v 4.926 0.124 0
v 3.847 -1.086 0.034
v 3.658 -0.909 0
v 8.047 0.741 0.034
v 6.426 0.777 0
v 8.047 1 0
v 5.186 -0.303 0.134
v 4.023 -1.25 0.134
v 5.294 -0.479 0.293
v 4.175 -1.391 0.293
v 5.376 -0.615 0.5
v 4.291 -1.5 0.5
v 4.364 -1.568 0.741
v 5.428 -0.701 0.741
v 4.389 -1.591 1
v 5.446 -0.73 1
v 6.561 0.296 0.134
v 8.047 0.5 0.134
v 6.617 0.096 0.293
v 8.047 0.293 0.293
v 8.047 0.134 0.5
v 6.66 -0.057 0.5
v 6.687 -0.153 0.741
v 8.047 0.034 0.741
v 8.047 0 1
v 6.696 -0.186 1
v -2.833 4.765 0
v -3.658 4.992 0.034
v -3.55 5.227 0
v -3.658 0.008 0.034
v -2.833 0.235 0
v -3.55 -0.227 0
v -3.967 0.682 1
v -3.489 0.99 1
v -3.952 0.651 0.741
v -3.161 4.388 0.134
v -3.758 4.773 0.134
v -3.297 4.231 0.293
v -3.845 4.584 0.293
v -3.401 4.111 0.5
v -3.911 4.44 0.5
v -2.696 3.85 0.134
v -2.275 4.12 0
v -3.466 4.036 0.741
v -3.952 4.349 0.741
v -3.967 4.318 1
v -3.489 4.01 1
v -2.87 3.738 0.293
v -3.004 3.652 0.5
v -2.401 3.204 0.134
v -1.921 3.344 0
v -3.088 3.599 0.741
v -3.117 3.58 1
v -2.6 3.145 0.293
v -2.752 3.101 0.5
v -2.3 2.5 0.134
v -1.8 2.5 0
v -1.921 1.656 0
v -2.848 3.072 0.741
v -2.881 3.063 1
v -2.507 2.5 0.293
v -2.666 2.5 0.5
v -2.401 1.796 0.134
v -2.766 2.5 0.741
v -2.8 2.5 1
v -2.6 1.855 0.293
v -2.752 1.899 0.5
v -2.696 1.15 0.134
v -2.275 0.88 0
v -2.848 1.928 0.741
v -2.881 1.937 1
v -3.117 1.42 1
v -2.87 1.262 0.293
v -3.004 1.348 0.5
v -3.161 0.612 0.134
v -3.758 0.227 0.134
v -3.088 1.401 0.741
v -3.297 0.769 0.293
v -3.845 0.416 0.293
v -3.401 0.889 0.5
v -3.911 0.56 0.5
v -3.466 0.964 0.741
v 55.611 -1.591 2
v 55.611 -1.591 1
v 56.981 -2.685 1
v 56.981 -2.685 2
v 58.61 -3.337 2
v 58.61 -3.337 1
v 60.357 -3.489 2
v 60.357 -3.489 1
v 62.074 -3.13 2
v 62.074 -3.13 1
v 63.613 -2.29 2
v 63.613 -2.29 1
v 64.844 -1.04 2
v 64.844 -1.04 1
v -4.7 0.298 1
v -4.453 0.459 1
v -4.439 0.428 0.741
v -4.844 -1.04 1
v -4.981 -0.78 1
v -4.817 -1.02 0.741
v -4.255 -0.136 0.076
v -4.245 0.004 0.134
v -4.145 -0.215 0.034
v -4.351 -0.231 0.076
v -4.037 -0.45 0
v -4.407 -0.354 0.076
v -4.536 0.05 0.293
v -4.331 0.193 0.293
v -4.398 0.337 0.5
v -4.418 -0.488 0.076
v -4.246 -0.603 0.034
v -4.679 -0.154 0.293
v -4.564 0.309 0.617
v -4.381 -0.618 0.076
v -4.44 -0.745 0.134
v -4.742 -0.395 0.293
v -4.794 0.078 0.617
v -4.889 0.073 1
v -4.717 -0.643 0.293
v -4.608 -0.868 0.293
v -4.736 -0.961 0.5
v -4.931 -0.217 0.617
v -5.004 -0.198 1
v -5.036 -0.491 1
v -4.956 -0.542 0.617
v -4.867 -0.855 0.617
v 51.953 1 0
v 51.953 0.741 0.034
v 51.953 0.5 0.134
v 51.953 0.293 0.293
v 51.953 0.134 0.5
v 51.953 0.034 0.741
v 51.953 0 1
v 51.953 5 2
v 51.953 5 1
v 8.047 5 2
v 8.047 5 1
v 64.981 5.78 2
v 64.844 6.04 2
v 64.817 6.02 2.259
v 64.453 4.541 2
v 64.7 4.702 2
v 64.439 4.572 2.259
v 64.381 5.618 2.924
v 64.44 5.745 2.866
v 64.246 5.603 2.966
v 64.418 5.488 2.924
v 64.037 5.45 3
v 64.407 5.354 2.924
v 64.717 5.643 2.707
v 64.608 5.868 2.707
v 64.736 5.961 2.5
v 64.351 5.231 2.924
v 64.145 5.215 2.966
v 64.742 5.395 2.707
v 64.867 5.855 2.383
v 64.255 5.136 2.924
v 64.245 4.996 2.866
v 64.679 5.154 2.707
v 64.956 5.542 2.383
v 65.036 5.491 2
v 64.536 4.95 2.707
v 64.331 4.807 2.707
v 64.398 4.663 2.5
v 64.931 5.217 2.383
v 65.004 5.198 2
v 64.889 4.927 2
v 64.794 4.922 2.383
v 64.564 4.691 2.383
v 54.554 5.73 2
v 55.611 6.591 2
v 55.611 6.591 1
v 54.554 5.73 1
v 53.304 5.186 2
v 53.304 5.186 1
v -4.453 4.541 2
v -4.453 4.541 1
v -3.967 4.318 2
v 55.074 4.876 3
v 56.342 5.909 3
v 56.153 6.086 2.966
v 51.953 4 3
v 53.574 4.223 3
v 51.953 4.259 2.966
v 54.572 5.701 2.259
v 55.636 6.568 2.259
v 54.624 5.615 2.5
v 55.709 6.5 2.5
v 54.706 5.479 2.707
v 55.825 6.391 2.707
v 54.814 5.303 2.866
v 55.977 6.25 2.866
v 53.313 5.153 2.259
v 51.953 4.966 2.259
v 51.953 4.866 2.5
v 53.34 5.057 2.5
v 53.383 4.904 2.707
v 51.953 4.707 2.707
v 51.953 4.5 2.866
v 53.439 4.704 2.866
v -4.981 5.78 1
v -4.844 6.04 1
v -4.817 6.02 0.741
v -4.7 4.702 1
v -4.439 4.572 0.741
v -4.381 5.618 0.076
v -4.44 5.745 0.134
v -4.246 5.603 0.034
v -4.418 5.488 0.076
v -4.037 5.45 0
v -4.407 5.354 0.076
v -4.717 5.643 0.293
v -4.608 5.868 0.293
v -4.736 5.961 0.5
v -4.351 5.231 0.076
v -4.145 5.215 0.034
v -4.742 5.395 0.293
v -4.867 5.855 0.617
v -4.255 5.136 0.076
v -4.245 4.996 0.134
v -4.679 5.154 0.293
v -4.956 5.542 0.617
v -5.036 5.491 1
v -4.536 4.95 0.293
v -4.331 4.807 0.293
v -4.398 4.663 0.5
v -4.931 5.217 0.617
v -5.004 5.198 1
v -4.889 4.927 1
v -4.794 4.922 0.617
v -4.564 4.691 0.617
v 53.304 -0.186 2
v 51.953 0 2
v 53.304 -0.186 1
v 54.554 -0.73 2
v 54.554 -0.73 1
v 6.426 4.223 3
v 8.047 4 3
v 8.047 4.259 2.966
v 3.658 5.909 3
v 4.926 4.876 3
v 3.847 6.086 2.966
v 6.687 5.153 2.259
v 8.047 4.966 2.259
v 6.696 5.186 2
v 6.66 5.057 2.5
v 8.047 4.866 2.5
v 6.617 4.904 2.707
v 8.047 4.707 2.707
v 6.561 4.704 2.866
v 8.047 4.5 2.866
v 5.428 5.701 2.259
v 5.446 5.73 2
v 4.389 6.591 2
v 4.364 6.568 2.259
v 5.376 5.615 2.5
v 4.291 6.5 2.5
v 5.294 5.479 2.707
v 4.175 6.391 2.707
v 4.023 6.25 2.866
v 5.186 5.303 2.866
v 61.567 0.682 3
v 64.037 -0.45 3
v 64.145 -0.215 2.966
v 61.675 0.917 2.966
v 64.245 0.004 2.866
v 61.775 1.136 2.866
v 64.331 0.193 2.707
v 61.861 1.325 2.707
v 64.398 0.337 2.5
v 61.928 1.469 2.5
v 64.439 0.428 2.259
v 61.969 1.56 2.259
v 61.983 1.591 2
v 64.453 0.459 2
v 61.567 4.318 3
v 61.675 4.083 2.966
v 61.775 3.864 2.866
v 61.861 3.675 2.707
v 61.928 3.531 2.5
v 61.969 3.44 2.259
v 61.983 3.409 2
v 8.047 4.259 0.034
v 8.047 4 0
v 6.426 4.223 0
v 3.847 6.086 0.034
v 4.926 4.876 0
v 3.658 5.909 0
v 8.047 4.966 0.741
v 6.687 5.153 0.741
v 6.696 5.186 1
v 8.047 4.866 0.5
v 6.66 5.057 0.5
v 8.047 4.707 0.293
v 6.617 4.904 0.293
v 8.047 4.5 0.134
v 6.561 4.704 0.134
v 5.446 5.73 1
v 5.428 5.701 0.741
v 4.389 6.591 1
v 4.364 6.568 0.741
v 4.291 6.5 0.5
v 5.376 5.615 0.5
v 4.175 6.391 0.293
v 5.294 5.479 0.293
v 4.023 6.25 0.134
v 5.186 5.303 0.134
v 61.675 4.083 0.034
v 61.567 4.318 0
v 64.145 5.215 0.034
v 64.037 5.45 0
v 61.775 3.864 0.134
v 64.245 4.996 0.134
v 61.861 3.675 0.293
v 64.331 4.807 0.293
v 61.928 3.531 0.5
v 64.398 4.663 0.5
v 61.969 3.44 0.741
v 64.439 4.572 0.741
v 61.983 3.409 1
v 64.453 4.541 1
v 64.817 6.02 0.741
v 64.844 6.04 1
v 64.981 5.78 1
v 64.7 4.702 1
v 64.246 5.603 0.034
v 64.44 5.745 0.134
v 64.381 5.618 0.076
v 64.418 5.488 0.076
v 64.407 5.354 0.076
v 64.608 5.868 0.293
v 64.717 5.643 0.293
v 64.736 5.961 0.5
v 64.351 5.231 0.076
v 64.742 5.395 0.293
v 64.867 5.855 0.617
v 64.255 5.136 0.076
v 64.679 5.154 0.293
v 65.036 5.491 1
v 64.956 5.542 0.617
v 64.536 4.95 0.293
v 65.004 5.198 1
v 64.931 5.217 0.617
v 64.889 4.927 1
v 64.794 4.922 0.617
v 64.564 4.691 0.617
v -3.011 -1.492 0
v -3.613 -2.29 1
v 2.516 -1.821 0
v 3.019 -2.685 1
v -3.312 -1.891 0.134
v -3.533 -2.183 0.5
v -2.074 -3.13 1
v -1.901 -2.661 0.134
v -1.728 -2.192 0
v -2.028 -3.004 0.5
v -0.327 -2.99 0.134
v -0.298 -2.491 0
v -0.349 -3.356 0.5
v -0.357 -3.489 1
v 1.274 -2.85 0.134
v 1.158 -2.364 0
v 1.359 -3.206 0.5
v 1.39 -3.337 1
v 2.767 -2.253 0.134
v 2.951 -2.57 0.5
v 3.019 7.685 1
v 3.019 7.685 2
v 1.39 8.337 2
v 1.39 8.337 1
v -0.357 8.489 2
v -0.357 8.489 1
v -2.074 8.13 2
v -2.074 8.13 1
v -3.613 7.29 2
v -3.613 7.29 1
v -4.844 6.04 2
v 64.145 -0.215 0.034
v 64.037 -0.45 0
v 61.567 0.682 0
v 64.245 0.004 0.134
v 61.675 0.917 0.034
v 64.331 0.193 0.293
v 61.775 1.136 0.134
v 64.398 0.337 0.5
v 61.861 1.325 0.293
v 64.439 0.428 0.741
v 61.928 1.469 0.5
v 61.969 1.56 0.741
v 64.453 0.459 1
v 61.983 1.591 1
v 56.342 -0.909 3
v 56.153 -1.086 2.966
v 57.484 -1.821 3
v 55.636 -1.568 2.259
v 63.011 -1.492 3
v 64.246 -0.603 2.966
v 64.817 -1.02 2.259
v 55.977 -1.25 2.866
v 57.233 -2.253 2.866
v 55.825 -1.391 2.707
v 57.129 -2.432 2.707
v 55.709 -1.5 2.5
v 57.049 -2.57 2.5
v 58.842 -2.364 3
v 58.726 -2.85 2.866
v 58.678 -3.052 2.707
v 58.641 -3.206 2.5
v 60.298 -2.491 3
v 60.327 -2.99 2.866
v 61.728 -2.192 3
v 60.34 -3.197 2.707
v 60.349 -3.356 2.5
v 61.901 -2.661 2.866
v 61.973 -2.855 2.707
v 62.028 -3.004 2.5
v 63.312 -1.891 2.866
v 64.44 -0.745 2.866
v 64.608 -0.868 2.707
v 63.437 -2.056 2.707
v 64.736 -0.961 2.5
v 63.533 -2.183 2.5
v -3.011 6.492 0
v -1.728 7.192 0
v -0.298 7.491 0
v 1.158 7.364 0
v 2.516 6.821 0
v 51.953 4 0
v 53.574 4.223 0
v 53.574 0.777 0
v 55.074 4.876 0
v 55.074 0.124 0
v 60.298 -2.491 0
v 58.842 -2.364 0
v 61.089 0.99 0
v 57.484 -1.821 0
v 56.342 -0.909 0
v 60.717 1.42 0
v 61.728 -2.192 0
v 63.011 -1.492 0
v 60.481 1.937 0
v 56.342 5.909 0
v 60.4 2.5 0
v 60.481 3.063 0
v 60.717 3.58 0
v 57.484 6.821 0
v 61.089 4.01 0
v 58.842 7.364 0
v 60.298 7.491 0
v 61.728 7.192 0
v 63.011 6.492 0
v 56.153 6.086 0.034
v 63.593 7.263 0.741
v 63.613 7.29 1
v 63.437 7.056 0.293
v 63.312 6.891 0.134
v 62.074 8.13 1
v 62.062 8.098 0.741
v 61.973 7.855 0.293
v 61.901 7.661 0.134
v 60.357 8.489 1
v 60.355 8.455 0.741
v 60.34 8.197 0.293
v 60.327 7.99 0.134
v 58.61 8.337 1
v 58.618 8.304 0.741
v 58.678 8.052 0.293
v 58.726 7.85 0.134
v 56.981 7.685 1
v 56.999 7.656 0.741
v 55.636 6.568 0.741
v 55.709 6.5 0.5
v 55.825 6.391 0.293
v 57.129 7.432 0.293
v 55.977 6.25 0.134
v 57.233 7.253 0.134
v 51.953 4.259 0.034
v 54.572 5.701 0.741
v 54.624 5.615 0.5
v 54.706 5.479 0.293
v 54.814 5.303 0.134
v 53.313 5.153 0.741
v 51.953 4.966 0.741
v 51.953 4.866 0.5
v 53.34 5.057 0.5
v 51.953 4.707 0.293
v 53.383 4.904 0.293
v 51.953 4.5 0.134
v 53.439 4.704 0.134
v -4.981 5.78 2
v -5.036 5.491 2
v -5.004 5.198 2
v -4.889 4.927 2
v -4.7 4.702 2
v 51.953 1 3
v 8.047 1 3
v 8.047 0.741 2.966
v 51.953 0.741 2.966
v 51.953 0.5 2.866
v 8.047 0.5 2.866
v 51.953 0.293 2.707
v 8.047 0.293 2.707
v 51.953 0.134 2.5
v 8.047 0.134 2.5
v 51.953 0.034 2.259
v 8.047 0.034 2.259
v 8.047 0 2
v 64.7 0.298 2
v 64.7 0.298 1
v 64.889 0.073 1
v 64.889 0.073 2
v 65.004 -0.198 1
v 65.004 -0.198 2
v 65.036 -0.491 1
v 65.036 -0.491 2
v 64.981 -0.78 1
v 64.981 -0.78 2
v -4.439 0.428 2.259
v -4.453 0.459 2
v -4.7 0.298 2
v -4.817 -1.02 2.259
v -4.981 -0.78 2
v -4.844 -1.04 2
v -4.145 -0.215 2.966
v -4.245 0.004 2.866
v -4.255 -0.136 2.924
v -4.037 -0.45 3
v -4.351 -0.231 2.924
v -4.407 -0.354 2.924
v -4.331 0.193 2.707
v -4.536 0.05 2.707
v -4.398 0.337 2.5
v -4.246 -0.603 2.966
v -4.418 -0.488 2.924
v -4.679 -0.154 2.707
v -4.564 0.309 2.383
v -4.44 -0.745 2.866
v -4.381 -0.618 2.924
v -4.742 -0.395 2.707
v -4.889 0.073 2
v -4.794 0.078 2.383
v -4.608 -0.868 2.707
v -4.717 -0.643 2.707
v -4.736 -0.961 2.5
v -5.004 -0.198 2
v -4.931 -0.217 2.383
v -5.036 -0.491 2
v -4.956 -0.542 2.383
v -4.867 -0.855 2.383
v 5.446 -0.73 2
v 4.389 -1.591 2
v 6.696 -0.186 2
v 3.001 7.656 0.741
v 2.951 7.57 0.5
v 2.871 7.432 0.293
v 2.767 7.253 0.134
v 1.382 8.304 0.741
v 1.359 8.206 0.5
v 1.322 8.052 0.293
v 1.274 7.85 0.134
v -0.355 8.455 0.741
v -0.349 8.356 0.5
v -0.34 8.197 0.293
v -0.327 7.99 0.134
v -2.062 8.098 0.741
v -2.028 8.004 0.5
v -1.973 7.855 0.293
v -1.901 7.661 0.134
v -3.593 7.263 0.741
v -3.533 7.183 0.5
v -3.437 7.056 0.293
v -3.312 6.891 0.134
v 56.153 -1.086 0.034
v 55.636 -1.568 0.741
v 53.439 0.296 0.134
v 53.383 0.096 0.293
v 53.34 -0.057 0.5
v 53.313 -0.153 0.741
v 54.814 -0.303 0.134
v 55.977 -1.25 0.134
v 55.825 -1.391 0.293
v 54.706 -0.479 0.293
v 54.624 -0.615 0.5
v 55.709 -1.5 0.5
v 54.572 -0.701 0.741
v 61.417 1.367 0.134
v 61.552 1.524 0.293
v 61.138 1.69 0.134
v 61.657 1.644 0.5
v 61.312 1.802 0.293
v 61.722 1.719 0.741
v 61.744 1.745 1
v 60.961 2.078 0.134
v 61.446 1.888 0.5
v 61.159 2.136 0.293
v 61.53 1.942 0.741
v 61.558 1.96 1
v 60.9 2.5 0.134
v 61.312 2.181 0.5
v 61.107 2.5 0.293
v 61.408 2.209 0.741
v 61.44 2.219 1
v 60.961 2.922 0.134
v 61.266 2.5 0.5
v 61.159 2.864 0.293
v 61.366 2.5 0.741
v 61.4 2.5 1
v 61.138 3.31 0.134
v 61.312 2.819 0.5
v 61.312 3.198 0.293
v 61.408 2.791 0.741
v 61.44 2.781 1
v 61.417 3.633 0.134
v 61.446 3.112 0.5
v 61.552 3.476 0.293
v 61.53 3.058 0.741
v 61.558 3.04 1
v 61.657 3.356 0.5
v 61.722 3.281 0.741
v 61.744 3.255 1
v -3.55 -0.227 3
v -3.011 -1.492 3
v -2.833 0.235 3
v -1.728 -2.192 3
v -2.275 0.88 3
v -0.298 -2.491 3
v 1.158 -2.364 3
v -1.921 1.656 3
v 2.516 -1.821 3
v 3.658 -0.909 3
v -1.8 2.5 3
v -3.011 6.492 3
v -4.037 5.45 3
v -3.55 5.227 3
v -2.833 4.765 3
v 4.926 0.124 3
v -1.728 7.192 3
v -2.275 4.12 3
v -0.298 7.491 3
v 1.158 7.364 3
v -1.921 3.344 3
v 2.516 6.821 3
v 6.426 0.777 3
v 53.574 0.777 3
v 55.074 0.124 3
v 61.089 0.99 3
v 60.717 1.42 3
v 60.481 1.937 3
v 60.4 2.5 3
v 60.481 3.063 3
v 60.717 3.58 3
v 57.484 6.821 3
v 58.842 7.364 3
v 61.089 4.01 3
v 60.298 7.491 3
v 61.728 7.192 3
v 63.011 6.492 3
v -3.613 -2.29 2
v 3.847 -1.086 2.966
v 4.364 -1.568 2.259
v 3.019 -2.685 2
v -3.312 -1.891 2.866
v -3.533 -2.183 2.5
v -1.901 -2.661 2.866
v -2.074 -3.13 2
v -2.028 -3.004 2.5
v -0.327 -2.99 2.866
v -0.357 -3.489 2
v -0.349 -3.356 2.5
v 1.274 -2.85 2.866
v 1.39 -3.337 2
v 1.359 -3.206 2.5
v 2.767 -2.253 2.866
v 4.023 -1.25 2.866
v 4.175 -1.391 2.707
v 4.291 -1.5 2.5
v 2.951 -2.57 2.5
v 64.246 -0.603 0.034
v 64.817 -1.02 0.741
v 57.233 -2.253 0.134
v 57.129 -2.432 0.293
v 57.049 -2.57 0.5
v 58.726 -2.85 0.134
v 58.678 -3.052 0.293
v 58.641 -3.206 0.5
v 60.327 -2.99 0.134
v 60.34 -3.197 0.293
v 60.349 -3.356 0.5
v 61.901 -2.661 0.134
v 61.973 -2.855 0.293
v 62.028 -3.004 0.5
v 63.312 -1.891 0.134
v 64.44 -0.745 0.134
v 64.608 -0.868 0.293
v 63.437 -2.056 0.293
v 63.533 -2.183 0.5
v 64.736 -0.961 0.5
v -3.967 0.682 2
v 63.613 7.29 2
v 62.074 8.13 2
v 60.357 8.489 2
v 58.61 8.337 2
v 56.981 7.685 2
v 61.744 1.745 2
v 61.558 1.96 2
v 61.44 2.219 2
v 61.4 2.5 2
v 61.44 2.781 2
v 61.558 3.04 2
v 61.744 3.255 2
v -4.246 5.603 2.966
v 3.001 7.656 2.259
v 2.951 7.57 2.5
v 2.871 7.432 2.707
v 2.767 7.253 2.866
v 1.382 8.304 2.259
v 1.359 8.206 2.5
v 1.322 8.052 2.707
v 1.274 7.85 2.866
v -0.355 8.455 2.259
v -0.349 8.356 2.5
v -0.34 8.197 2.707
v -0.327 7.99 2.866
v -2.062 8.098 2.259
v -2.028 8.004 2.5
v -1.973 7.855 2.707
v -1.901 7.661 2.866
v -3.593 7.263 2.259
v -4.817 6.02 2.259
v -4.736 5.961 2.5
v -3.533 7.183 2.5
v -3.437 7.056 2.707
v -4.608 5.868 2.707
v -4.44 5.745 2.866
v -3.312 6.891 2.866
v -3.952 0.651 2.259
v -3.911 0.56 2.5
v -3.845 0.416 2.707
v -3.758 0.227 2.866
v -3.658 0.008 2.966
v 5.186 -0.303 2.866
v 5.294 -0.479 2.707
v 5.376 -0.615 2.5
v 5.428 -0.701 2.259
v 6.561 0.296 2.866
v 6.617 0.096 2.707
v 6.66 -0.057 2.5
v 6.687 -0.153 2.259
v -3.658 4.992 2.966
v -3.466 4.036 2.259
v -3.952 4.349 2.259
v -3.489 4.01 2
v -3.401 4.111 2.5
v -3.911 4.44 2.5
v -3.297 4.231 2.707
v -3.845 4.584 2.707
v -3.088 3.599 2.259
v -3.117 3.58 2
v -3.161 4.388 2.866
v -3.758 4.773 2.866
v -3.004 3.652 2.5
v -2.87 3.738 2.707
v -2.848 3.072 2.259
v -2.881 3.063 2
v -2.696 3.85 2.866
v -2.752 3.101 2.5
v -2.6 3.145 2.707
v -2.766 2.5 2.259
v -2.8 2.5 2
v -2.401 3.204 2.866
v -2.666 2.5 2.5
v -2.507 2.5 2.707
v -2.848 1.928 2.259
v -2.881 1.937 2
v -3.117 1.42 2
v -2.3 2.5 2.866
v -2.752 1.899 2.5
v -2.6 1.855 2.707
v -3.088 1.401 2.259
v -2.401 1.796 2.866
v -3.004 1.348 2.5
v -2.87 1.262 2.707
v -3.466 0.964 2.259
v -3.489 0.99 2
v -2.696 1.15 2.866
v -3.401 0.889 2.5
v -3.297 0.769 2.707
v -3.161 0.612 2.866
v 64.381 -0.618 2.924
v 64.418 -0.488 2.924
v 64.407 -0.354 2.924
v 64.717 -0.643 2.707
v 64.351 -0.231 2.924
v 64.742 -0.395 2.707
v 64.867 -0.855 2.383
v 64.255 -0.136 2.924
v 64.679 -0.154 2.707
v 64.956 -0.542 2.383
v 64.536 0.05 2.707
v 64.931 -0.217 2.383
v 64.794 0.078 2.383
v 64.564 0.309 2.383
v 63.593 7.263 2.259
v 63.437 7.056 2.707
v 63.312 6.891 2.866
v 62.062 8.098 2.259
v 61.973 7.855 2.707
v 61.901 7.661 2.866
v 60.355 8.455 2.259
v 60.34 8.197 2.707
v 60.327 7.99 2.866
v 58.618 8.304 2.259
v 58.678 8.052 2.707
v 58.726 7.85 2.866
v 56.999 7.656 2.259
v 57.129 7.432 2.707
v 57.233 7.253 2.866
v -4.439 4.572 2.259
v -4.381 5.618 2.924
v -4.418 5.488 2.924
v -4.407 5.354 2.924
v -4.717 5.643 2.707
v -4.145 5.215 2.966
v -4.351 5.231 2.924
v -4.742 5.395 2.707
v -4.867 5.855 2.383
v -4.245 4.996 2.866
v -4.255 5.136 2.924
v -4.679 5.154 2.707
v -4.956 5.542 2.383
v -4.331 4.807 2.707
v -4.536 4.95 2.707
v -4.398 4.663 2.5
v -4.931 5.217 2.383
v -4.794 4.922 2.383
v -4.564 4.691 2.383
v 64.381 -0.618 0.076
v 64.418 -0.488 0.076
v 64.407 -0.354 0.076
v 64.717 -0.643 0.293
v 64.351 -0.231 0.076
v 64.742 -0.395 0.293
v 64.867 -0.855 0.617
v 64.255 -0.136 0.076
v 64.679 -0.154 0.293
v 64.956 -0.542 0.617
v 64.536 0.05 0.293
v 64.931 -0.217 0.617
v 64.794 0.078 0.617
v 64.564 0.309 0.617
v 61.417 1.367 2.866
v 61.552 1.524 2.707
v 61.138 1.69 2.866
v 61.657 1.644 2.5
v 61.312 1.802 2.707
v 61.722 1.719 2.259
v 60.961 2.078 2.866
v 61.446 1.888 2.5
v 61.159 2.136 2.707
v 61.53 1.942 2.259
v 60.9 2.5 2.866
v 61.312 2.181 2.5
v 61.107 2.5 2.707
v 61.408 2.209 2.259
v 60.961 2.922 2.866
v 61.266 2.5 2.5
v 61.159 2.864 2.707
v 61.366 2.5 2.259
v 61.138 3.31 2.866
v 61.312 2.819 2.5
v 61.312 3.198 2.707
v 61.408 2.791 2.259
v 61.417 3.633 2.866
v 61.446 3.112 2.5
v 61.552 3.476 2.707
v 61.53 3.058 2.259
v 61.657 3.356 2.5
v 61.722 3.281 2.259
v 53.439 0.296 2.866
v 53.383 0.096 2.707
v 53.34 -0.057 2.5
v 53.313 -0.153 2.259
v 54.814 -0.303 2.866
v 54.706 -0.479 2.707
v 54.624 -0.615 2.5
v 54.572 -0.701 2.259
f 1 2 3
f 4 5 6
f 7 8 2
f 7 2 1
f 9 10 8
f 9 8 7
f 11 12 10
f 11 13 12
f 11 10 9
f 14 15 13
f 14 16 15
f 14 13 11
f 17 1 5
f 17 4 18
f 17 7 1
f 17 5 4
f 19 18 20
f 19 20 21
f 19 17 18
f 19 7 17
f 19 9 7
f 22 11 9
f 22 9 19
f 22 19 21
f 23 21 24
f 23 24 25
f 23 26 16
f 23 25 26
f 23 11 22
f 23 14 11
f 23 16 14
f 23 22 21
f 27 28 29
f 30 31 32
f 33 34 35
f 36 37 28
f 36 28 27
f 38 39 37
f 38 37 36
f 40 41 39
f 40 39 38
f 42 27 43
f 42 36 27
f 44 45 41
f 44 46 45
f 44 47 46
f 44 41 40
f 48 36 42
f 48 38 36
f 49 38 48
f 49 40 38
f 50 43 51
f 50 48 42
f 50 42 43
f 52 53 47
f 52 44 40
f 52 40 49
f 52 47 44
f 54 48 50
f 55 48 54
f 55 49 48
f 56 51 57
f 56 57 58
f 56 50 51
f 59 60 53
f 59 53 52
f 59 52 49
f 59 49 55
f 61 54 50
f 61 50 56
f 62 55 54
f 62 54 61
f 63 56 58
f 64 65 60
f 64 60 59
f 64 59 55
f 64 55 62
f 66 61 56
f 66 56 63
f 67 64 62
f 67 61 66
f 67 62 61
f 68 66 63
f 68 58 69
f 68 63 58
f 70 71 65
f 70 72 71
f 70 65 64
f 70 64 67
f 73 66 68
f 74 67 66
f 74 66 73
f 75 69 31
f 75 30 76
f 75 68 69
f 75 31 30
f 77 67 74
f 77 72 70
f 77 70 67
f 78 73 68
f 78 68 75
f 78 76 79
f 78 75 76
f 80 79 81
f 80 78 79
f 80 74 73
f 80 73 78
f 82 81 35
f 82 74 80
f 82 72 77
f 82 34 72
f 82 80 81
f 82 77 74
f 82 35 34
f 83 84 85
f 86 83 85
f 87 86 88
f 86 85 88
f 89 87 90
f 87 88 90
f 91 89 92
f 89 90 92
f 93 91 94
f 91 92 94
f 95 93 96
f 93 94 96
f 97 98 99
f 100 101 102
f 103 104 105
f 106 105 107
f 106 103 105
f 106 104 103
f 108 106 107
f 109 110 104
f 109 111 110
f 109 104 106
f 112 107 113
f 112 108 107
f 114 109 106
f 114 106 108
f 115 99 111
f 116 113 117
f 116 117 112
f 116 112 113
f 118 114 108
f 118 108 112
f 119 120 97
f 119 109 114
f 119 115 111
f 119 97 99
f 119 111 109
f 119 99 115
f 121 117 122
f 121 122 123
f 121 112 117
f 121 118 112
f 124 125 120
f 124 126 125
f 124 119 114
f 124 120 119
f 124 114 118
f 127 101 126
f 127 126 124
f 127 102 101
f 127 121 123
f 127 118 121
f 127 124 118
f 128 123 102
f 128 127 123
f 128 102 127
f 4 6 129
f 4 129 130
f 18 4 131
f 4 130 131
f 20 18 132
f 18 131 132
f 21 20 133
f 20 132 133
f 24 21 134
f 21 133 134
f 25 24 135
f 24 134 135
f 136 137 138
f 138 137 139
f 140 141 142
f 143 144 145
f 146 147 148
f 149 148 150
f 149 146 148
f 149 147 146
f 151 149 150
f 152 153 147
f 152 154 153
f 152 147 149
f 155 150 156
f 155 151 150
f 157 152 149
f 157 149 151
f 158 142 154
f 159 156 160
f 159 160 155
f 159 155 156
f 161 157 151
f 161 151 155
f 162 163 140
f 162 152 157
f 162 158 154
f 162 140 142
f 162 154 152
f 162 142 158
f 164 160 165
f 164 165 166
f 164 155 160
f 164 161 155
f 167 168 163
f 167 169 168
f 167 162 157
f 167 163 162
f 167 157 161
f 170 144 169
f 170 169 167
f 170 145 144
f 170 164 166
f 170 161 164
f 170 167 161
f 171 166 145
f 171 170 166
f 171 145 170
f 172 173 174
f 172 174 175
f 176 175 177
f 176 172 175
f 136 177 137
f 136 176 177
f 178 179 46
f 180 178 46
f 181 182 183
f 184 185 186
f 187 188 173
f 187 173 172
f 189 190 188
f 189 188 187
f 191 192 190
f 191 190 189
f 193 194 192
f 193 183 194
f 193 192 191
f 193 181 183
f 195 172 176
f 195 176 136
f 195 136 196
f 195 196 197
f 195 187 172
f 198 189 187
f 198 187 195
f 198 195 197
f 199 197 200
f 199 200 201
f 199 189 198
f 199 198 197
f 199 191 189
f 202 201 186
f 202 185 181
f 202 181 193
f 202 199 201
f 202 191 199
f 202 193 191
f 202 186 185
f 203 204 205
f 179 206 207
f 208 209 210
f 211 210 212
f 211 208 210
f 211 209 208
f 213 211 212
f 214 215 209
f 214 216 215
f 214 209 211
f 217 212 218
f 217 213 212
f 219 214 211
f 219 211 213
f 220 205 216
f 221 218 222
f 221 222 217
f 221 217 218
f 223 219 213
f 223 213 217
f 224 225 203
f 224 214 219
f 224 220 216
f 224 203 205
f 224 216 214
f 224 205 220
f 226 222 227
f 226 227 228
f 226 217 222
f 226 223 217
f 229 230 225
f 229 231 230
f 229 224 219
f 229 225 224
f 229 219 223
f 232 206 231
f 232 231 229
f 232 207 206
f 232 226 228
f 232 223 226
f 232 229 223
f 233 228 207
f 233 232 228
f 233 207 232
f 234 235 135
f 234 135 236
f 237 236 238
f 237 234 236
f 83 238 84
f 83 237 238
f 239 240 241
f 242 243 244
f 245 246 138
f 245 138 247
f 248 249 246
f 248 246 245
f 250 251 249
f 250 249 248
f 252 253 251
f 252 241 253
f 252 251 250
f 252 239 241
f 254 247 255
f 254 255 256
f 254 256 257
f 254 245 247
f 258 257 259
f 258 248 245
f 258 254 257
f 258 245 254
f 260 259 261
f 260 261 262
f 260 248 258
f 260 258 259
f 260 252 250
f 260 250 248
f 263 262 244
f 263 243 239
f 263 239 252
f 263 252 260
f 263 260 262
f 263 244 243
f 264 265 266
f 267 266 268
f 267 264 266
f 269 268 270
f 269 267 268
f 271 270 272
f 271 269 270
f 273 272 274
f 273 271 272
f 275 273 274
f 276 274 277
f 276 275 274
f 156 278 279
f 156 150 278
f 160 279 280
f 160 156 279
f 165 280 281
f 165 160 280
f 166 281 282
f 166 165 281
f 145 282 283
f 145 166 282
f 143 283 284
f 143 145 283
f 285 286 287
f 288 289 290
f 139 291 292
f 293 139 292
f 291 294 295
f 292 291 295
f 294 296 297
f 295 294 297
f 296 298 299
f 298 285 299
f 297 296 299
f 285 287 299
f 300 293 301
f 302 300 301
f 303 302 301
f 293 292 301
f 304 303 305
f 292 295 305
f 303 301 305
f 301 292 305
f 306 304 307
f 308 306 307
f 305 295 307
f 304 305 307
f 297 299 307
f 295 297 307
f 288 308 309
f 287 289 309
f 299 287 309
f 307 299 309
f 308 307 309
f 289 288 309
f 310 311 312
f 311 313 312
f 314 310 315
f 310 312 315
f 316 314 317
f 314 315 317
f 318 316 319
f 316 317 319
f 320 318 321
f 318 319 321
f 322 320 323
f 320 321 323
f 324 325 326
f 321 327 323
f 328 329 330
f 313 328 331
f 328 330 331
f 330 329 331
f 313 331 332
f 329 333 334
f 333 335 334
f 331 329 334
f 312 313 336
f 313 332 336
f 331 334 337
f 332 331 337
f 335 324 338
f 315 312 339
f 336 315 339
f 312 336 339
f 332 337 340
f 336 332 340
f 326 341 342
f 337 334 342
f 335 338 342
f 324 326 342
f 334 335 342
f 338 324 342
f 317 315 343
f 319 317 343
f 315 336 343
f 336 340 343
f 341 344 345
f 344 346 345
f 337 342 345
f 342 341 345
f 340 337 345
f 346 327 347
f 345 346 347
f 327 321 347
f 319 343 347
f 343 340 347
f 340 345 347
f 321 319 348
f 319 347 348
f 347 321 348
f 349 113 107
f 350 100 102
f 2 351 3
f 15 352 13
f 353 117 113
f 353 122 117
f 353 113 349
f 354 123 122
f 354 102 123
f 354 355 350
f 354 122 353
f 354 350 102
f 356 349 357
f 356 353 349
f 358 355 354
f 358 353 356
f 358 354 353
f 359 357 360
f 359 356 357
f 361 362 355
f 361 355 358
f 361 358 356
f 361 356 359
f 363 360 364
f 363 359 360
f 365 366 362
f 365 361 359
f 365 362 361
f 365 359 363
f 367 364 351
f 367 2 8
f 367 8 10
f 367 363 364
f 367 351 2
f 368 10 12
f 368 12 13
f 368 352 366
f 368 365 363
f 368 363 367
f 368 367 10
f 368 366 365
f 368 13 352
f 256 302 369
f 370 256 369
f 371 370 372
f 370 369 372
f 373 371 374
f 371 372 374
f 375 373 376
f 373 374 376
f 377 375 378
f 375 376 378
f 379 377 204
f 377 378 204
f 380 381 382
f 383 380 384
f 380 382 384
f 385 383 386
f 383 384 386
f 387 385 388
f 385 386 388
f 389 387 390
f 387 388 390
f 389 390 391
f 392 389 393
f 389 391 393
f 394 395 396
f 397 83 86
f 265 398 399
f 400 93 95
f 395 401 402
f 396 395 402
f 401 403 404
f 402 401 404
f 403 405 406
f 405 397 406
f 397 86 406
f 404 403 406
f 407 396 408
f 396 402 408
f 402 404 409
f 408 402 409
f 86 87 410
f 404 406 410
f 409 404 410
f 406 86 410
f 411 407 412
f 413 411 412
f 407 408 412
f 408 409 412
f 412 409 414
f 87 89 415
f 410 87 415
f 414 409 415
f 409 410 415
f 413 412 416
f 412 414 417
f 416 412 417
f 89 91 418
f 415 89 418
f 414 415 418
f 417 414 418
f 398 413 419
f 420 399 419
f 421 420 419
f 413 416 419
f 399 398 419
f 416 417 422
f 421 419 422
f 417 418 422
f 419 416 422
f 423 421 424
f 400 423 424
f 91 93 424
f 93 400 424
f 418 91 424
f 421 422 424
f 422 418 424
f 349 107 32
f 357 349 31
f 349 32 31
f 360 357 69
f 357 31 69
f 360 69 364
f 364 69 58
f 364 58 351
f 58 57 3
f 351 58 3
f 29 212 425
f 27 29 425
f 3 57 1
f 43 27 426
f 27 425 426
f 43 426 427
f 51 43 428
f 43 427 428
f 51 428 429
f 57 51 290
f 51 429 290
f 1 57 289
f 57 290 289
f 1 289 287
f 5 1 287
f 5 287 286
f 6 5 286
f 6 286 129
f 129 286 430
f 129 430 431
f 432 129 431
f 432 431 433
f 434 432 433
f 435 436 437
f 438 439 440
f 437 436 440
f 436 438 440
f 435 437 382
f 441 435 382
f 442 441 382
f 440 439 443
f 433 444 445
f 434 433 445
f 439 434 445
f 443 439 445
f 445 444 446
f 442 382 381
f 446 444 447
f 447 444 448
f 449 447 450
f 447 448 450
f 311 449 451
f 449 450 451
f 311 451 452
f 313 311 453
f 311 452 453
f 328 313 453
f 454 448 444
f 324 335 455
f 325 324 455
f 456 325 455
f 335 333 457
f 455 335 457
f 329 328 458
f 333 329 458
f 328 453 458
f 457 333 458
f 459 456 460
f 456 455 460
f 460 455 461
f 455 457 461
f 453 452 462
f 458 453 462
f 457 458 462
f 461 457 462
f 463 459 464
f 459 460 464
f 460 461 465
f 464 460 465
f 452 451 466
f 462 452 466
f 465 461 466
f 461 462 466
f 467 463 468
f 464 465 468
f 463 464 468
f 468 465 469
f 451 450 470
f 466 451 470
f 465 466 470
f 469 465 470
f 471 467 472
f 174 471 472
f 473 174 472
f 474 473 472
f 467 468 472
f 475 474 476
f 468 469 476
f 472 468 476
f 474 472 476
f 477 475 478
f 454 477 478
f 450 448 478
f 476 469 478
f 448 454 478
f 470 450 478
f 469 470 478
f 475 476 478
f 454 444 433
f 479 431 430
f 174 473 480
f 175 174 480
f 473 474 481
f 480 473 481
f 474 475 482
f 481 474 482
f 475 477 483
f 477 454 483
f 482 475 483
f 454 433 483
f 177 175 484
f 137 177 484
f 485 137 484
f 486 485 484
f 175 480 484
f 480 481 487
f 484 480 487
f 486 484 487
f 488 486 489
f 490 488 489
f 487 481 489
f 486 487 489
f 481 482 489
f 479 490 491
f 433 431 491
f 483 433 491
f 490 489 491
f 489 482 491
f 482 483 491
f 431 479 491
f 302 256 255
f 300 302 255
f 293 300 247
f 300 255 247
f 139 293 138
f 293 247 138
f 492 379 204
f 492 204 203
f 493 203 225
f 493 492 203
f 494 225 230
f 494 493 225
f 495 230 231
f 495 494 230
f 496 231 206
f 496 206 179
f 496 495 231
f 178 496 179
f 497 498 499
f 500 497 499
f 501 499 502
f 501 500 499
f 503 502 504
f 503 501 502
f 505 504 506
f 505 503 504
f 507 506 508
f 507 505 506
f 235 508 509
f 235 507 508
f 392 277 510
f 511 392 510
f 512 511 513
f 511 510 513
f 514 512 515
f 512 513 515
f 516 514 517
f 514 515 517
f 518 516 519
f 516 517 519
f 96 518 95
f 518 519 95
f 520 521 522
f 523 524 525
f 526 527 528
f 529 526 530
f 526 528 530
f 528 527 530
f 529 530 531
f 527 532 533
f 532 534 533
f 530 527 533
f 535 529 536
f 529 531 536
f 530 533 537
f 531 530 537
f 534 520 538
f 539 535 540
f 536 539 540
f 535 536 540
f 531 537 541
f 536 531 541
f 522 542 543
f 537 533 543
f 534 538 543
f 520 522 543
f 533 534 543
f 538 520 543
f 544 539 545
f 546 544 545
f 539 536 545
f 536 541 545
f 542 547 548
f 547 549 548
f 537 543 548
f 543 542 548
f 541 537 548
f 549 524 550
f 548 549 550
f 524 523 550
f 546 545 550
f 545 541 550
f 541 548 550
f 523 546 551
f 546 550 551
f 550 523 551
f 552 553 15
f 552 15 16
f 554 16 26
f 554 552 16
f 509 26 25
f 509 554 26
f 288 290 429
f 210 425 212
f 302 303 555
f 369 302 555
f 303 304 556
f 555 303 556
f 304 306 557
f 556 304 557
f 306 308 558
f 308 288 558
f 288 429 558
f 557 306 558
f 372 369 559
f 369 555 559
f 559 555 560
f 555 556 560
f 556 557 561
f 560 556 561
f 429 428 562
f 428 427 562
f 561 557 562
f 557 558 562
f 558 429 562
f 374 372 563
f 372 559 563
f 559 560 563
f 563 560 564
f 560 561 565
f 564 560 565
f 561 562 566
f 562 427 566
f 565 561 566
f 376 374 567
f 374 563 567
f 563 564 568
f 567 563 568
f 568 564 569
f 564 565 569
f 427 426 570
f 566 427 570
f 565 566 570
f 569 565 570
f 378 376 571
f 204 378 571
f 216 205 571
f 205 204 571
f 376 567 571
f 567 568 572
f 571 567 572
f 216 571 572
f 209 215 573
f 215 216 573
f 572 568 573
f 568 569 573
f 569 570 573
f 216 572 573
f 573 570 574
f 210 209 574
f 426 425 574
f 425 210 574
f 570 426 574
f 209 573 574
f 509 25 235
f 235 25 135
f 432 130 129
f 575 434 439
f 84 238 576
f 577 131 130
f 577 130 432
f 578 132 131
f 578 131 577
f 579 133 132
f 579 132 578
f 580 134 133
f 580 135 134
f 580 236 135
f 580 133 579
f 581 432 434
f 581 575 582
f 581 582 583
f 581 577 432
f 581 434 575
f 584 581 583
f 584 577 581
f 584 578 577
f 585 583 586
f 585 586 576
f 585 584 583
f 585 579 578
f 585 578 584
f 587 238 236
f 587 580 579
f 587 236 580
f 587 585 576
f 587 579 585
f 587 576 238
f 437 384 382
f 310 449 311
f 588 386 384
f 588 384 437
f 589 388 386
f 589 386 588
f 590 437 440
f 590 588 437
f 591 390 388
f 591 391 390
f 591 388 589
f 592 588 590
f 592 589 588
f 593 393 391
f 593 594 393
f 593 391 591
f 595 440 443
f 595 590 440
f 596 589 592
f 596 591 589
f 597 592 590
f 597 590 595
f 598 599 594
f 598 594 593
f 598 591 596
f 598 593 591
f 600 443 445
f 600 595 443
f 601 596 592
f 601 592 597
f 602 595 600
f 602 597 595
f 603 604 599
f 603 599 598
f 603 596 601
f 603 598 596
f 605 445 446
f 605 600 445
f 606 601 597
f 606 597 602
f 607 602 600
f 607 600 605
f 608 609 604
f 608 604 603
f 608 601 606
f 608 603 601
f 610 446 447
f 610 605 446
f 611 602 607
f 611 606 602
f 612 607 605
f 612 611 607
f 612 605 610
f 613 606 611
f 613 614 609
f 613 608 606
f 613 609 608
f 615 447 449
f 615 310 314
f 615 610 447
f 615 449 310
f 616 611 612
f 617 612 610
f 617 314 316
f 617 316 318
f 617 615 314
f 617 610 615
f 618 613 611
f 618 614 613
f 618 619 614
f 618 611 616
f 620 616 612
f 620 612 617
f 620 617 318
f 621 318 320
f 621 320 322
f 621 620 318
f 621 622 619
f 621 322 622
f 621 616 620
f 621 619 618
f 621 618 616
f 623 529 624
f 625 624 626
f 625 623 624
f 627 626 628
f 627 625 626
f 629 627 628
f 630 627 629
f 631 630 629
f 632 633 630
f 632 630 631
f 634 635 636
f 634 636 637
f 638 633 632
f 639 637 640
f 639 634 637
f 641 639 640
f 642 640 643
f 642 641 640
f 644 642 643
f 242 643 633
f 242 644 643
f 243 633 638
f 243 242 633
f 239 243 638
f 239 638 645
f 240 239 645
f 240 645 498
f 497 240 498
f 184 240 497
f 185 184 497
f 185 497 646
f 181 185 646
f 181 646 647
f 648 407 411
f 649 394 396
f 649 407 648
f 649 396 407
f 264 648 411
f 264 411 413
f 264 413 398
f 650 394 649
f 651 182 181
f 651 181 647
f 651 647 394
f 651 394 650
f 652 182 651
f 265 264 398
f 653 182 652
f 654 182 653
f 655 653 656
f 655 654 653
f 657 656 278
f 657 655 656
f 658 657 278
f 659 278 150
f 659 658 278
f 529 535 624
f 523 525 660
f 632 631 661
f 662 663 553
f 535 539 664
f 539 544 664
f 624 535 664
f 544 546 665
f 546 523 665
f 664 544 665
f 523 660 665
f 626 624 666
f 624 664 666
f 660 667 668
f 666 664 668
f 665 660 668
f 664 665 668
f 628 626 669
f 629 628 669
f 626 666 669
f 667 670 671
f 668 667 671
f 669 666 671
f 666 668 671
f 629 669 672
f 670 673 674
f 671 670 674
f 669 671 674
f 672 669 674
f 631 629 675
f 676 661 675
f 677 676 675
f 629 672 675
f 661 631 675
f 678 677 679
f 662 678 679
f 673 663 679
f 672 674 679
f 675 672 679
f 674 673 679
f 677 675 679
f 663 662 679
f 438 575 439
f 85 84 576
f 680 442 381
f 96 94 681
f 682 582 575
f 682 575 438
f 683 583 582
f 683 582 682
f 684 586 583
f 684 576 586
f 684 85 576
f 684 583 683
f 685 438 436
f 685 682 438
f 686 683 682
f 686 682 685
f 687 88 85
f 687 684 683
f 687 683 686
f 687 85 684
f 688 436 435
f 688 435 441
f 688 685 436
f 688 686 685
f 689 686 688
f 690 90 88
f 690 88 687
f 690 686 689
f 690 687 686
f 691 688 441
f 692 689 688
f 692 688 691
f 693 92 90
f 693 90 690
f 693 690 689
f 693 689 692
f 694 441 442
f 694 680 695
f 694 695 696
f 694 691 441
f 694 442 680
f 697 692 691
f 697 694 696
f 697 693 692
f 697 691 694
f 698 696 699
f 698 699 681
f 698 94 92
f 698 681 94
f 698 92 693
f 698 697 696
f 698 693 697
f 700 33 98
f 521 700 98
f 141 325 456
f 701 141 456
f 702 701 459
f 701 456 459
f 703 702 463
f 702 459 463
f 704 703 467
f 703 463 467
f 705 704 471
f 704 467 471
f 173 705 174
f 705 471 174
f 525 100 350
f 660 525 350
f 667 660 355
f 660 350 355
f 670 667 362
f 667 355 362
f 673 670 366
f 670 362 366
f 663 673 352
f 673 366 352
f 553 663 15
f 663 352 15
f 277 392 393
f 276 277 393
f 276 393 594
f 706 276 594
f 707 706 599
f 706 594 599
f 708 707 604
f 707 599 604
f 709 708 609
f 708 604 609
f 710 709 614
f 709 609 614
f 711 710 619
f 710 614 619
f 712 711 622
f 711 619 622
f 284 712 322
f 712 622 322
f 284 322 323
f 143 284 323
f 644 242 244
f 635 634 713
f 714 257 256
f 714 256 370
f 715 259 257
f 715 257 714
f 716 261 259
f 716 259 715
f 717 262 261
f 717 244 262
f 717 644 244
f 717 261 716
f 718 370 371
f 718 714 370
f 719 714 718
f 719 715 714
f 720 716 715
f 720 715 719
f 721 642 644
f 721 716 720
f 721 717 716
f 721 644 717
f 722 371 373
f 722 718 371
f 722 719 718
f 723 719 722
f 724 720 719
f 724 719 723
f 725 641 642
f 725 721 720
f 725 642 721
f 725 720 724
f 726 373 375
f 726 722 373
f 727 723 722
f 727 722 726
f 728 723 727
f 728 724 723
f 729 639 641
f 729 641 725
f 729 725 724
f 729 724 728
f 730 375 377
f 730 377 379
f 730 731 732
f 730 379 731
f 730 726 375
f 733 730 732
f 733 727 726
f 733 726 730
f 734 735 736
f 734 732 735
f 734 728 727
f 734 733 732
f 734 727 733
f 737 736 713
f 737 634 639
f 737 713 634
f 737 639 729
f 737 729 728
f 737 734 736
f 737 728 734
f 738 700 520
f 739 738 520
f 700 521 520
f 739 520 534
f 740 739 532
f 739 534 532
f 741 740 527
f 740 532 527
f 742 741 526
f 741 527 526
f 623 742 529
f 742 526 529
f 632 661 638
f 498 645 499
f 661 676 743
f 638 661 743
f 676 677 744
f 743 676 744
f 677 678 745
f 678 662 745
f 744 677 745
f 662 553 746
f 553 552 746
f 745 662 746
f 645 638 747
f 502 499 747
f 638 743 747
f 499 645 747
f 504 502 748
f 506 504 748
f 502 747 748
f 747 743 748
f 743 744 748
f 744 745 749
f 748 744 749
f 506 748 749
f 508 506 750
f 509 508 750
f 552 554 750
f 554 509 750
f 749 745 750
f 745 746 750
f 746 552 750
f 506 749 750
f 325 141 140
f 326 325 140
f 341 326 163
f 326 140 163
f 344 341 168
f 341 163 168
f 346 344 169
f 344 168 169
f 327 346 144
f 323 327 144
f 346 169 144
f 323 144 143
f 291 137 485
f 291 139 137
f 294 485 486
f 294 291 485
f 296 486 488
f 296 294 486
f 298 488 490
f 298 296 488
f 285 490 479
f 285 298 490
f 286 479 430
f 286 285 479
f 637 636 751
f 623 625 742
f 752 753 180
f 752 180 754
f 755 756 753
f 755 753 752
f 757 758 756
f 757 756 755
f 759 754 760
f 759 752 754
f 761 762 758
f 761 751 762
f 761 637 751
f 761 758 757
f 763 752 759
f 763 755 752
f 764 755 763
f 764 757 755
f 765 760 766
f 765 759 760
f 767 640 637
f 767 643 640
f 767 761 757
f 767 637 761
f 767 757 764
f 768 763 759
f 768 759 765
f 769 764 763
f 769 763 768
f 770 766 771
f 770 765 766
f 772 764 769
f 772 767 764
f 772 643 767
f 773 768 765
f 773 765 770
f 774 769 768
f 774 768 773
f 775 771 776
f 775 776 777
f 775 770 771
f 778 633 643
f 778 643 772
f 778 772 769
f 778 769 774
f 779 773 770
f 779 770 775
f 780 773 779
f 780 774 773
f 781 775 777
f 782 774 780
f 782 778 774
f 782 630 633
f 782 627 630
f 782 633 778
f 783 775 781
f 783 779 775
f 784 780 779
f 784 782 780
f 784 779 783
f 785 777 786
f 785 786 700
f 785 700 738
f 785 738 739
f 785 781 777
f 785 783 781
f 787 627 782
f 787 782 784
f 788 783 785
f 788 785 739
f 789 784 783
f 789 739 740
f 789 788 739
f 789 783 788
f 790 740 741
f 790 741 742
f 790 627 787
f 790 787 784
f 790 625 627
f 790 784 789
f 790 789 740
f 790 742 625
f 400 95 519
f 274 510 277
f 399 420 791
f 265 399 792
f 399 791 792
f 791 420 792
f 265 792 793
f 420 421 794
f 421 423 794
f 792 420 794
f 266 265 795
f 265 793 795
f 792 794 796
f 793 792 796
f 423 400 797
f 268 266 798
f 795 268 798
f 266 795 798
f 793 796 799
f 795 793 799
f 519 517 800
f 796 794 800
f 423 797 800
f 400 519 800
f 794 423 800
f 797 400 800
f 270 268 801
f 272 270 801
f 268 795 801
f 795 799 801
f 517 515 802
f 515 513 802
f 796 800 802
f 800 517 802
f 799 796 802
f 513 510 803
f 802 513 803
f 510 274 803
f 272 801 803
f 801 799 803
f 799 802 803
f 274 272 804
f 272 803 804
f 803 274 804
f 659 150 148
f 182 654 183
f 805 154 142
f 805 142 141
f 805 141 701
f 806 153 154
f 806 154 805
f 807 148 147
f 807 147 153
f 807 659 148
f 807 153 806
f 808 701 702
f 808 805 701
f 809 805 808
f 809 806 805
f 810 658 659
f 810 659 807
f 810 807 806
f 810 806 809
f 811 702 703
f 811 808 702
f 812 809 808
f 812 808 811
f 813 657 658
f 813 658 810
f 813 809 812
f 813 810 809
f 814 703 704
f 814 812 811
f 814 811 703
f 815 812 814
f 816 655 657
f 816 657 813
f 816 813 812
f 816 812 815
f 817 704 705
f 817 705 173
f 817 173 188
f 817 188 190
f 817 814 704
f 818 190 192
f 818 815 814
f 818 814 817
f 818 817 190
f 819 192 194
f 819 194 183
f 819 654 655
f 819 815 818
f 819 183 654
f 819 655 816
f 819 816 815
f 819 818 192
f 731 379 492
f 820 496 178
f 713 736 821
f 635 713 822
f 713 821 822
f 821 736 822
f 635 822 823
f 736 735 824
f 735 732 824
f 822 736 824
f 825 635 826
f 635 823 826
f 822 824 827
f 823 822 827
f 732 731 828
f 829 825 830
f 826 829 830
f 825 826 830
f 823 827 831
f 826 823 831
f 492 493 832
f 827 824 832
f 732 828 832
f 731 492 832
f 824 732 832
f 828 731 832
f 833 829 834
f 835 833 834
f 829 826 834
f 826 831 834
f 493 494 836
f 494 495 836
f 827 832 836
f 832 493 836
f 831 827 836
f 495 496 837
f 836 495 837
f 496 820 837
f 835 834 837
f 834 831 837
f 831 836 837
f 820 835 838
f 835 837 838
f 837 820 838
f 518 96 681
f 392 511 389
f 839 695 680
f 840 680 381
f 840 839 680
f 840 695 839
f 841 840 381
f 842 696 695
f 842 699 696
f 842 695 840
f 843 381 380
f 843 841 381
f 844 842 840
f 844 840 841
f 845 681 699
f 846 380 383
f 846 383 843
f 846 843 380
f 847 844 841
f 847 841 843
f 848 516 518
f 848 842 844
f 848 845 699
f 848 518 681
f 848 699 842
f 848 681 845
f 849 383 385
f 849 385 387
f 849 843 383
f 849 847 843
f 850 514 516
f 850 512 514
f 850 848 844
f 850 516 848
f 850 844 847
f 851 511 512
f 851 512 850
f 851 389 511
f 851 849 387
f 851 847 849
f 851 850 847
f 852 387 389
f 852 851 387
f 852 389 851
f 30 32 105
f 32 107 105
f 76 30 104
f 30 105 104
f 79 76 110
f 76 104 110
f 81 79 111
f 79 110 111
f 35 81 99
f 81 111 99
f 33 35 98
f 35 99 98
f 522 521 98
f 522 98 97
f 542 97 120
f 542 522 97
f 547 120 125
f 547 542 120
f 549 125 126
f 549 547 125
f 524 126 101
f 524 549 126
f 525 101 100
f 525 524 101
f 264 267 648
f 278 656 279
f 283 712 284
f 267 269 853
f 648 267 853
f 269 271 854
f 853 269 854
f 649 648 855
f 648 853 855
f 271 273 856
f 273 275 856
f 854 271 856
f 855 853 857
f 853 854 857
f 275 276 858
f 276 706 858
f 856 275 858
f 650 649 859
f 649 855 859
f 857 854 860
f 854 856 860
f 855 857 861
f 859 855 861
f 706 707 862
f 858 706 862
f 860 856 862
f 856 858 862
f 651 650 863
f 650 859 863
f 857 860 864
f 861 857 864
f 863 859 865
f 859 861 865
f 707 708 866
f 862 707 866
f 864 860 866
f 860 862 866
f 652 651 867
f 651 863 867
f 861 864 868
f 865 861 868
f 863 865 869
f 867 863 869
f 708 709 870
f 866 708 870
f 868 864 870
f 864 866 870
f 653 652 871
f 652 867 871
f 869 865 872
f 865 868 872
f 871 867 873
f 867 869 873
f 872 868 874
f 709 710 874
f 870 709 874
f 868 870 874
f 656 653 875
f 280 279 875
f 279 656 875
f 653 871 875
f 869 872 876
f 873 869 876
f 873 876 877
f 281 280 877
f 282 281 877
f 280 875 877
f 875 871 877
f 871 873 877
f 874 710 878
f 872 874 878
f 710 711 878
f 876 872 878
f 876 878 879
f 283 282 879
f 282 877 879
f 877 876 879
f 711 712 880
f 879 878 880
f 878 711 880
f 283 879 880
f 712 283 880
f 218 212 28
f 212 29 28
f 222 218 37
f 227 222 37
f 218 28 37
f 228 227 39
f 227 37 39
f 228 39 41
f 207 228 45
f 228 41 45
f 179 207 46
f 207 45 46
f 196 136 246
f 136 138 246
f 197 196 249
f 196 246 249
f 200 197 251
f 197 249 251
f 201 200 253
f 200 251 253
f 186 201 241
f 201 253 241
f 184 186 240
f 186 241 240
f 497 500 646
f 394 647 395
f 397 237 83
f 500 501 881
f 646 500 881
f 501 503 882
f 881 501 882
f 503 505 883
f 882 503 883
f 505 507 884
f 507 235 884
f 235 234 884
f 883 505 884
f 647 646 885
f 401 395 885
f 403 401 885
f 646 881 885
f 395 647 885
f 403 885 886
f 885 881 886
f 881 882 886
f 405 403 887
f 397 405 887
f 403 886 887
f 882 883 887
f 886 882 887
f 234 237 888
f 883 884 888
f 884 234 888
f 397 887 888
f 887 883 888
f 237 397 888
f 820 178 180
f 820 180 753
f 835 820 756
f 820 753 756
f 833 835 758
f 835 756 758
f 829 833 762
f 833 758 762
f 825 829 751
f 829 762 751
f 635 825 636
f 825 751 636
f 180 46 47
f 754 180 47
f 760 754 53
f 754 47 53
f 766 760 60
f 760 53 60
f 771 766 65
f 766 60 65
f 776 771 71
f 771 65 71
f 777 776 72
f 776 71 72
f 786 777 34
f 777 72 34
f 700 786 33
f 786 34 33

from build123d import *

# Parameters (mm, degrees)
F1_DEPTH = 3
F2_R     = 5
F3_R     = 1


with BuildPart() as f1:
    # F0 (on Top) → F1 (new body)
    with BuildSketch(Plane.XY):
        with BuildLine():
            Line((0, 5), (0, 0))
            Line((0, 0), (5.4543560573, 0))
            ThreePointArc((5.4543560573, 0), (6, 2.5), (5.4543560573, 5))
            Line((5.4543560573, 5), (0, 5))
        make_face()
        with BuildLine():
            Line((-5.4543560573, 0), (0, 0))
            Line((0, 0), (0, 5))
            Line((0, 5), (-5.4543560573, 5))
            Line((-5.4543560573, 5), (-3.9666666667, 4.3181186858))
            ThreePointArc((-3.9666666667, 4.3181186858), (-2.8, 2.5), (-3.9666666667, 0.6818813142))
            Line((-3.9666666667, 0.6818813142), (-5.4543560573, 0))
        make_face()
        with BuildLine():
            Line((5.4543560573, 0), (0, 0))
            Line((0, 0), (-5.4543560573, 0))
            ThreePointArc((-5.4543560573, 0), (0, -3.5), (5.4543560573, 0))
        make_face()
        with BuildLine():
            ThreePointArc((5.4543560573, 5), (6, 2.5), (5.4543560573, 0))
            Line((5.4543560573, 0), (54.5456439427, 0))
            ThreePointArc((54.5456439427, 0), (54, 2.5), (54.5456439427, 5))
            Line((54.5456439427, 5), (5.4543560573, 5))
        make_face()
        with BuildLine():
            Line((-5.4543560573, 5), (0, 5))
            Line((0, 5), (5.4543560573, 5))
            ThreePointArc((5.4543560573, 5), (0, 8.5), (-5.4543560573, 5))
        make_face()
        with BuildLine():
            ThreePointArc((54.5456439427, 5), (54, 2.5), (54.5456439427, 0))
            Line((54.5456439427, 0), (60, 0))
            Line((60, 0), (60, 2.5))
            Line((60, 2.5), (60, 5))
            Line((60, 5), (54.5456439427, 5))
        make_face()
        with BuildLine():
            Line((60, 0), (54.5456439427, 0))
            ThreePointArc((54.5456439427, 0), (60, -3.5), (65.4543560573, 0))
            Line((65.4543560573, 0), (60, 0))
        make_face()
        Polygon((60, 2.5), (60, 0), (65.4543560573, 0), (61.9833333333, 1.5909406571), align=None)
        with BuildLine():
            ThreePointArc((65.4543560573, 5), (60, 8.5), (54.5456439427, 5))
            Line((54.5456439427, 5), (60, 5))
            Line((60, 5), (65.4543560573, 5))
        make_face()
        with BuildLine():
            Line((61.9833333333, 3.4090593429), (60, 2.5))
            Line((60, 2.5), (61.9833333333, 1.5909406571))
            ThreePointArc((61.9833333333, 1.5909406571), (61.4, 2.5), (61.9833333333, 3.4090593429))
        make_face()
        Polygon((60, 5), (60, 2.5), (61.9833333333, 3.4090593429), (65.4543560573, 5), align=None)
    extrude(amount=F1_DEPTH)

    # F2
    f2_edges = [f1.edges().sort_by_distance(p)[0] for p in [
        (5.454356, 0, 1.5),
        (54.545644, 0, 1.5),
        (54.545644, 5, 1.5),
        (5.454356, 5, 1.5),
    ]]
    fillet(f2_edges, radius=F2_R)

    # F3
    f3_edges = [f1.edges().sort_by_distance(p)[0] for p in [
        (-0.957301, 8.423139, 3),
        (6.052428, 5.414945, 3),
        (-4.710511, 4.659059, 3),
        (30, 5, 3),
        (-2.8, 2.5, 3),
        (53.947572, 5.414945, 3),
        (-4.710511, 0.340941, 3),
        (60.957301, 8.423139, 3),
        (-0.957301, -3.423139, 3),
        (63.718845, 4.20453, 3),
        (6.052428, -0.414945, 3),
        (61.4, 2.5, 3),
        (30, 0, 3),
        (63.718845, 0.79547, 3),
        (53.947572, -0.414945, 3),
        (60.957301, -3.423139, 3),
        (-0.957301, 8.423139, 0),
        (6.052428, 5.414945, 0),
        (-4.710511, 4.659059, 0),
        (30, 5, 0),
        (-2.8, 2.5, 0),
        (53.947572, 5.414945, 0),
        (-4.710511, 0.340941, 0),
        (60.957301, 8.423139, 0),
        (-0.957301, -3.423139, 0),
        (63.718845, 4.20453, 0),
        (6.052428, -0.414945, 0),
        (61.4, 2.5, 0),
        (30, 0, 0),
        (63.718845, 0.79547, 0),
        (53.947572, -0.414945, 0),
        (60.957301, -3.423139, 0),
        (65.454356, 0, 1.5),
        (65.454356, 5, 1.5),
        (-5.454356, 0, 1.5),
        (-5.454356, 5, 1.5),
    ]]
    fillet(f3_edges, radius=F3_R)


solid = f1.part
